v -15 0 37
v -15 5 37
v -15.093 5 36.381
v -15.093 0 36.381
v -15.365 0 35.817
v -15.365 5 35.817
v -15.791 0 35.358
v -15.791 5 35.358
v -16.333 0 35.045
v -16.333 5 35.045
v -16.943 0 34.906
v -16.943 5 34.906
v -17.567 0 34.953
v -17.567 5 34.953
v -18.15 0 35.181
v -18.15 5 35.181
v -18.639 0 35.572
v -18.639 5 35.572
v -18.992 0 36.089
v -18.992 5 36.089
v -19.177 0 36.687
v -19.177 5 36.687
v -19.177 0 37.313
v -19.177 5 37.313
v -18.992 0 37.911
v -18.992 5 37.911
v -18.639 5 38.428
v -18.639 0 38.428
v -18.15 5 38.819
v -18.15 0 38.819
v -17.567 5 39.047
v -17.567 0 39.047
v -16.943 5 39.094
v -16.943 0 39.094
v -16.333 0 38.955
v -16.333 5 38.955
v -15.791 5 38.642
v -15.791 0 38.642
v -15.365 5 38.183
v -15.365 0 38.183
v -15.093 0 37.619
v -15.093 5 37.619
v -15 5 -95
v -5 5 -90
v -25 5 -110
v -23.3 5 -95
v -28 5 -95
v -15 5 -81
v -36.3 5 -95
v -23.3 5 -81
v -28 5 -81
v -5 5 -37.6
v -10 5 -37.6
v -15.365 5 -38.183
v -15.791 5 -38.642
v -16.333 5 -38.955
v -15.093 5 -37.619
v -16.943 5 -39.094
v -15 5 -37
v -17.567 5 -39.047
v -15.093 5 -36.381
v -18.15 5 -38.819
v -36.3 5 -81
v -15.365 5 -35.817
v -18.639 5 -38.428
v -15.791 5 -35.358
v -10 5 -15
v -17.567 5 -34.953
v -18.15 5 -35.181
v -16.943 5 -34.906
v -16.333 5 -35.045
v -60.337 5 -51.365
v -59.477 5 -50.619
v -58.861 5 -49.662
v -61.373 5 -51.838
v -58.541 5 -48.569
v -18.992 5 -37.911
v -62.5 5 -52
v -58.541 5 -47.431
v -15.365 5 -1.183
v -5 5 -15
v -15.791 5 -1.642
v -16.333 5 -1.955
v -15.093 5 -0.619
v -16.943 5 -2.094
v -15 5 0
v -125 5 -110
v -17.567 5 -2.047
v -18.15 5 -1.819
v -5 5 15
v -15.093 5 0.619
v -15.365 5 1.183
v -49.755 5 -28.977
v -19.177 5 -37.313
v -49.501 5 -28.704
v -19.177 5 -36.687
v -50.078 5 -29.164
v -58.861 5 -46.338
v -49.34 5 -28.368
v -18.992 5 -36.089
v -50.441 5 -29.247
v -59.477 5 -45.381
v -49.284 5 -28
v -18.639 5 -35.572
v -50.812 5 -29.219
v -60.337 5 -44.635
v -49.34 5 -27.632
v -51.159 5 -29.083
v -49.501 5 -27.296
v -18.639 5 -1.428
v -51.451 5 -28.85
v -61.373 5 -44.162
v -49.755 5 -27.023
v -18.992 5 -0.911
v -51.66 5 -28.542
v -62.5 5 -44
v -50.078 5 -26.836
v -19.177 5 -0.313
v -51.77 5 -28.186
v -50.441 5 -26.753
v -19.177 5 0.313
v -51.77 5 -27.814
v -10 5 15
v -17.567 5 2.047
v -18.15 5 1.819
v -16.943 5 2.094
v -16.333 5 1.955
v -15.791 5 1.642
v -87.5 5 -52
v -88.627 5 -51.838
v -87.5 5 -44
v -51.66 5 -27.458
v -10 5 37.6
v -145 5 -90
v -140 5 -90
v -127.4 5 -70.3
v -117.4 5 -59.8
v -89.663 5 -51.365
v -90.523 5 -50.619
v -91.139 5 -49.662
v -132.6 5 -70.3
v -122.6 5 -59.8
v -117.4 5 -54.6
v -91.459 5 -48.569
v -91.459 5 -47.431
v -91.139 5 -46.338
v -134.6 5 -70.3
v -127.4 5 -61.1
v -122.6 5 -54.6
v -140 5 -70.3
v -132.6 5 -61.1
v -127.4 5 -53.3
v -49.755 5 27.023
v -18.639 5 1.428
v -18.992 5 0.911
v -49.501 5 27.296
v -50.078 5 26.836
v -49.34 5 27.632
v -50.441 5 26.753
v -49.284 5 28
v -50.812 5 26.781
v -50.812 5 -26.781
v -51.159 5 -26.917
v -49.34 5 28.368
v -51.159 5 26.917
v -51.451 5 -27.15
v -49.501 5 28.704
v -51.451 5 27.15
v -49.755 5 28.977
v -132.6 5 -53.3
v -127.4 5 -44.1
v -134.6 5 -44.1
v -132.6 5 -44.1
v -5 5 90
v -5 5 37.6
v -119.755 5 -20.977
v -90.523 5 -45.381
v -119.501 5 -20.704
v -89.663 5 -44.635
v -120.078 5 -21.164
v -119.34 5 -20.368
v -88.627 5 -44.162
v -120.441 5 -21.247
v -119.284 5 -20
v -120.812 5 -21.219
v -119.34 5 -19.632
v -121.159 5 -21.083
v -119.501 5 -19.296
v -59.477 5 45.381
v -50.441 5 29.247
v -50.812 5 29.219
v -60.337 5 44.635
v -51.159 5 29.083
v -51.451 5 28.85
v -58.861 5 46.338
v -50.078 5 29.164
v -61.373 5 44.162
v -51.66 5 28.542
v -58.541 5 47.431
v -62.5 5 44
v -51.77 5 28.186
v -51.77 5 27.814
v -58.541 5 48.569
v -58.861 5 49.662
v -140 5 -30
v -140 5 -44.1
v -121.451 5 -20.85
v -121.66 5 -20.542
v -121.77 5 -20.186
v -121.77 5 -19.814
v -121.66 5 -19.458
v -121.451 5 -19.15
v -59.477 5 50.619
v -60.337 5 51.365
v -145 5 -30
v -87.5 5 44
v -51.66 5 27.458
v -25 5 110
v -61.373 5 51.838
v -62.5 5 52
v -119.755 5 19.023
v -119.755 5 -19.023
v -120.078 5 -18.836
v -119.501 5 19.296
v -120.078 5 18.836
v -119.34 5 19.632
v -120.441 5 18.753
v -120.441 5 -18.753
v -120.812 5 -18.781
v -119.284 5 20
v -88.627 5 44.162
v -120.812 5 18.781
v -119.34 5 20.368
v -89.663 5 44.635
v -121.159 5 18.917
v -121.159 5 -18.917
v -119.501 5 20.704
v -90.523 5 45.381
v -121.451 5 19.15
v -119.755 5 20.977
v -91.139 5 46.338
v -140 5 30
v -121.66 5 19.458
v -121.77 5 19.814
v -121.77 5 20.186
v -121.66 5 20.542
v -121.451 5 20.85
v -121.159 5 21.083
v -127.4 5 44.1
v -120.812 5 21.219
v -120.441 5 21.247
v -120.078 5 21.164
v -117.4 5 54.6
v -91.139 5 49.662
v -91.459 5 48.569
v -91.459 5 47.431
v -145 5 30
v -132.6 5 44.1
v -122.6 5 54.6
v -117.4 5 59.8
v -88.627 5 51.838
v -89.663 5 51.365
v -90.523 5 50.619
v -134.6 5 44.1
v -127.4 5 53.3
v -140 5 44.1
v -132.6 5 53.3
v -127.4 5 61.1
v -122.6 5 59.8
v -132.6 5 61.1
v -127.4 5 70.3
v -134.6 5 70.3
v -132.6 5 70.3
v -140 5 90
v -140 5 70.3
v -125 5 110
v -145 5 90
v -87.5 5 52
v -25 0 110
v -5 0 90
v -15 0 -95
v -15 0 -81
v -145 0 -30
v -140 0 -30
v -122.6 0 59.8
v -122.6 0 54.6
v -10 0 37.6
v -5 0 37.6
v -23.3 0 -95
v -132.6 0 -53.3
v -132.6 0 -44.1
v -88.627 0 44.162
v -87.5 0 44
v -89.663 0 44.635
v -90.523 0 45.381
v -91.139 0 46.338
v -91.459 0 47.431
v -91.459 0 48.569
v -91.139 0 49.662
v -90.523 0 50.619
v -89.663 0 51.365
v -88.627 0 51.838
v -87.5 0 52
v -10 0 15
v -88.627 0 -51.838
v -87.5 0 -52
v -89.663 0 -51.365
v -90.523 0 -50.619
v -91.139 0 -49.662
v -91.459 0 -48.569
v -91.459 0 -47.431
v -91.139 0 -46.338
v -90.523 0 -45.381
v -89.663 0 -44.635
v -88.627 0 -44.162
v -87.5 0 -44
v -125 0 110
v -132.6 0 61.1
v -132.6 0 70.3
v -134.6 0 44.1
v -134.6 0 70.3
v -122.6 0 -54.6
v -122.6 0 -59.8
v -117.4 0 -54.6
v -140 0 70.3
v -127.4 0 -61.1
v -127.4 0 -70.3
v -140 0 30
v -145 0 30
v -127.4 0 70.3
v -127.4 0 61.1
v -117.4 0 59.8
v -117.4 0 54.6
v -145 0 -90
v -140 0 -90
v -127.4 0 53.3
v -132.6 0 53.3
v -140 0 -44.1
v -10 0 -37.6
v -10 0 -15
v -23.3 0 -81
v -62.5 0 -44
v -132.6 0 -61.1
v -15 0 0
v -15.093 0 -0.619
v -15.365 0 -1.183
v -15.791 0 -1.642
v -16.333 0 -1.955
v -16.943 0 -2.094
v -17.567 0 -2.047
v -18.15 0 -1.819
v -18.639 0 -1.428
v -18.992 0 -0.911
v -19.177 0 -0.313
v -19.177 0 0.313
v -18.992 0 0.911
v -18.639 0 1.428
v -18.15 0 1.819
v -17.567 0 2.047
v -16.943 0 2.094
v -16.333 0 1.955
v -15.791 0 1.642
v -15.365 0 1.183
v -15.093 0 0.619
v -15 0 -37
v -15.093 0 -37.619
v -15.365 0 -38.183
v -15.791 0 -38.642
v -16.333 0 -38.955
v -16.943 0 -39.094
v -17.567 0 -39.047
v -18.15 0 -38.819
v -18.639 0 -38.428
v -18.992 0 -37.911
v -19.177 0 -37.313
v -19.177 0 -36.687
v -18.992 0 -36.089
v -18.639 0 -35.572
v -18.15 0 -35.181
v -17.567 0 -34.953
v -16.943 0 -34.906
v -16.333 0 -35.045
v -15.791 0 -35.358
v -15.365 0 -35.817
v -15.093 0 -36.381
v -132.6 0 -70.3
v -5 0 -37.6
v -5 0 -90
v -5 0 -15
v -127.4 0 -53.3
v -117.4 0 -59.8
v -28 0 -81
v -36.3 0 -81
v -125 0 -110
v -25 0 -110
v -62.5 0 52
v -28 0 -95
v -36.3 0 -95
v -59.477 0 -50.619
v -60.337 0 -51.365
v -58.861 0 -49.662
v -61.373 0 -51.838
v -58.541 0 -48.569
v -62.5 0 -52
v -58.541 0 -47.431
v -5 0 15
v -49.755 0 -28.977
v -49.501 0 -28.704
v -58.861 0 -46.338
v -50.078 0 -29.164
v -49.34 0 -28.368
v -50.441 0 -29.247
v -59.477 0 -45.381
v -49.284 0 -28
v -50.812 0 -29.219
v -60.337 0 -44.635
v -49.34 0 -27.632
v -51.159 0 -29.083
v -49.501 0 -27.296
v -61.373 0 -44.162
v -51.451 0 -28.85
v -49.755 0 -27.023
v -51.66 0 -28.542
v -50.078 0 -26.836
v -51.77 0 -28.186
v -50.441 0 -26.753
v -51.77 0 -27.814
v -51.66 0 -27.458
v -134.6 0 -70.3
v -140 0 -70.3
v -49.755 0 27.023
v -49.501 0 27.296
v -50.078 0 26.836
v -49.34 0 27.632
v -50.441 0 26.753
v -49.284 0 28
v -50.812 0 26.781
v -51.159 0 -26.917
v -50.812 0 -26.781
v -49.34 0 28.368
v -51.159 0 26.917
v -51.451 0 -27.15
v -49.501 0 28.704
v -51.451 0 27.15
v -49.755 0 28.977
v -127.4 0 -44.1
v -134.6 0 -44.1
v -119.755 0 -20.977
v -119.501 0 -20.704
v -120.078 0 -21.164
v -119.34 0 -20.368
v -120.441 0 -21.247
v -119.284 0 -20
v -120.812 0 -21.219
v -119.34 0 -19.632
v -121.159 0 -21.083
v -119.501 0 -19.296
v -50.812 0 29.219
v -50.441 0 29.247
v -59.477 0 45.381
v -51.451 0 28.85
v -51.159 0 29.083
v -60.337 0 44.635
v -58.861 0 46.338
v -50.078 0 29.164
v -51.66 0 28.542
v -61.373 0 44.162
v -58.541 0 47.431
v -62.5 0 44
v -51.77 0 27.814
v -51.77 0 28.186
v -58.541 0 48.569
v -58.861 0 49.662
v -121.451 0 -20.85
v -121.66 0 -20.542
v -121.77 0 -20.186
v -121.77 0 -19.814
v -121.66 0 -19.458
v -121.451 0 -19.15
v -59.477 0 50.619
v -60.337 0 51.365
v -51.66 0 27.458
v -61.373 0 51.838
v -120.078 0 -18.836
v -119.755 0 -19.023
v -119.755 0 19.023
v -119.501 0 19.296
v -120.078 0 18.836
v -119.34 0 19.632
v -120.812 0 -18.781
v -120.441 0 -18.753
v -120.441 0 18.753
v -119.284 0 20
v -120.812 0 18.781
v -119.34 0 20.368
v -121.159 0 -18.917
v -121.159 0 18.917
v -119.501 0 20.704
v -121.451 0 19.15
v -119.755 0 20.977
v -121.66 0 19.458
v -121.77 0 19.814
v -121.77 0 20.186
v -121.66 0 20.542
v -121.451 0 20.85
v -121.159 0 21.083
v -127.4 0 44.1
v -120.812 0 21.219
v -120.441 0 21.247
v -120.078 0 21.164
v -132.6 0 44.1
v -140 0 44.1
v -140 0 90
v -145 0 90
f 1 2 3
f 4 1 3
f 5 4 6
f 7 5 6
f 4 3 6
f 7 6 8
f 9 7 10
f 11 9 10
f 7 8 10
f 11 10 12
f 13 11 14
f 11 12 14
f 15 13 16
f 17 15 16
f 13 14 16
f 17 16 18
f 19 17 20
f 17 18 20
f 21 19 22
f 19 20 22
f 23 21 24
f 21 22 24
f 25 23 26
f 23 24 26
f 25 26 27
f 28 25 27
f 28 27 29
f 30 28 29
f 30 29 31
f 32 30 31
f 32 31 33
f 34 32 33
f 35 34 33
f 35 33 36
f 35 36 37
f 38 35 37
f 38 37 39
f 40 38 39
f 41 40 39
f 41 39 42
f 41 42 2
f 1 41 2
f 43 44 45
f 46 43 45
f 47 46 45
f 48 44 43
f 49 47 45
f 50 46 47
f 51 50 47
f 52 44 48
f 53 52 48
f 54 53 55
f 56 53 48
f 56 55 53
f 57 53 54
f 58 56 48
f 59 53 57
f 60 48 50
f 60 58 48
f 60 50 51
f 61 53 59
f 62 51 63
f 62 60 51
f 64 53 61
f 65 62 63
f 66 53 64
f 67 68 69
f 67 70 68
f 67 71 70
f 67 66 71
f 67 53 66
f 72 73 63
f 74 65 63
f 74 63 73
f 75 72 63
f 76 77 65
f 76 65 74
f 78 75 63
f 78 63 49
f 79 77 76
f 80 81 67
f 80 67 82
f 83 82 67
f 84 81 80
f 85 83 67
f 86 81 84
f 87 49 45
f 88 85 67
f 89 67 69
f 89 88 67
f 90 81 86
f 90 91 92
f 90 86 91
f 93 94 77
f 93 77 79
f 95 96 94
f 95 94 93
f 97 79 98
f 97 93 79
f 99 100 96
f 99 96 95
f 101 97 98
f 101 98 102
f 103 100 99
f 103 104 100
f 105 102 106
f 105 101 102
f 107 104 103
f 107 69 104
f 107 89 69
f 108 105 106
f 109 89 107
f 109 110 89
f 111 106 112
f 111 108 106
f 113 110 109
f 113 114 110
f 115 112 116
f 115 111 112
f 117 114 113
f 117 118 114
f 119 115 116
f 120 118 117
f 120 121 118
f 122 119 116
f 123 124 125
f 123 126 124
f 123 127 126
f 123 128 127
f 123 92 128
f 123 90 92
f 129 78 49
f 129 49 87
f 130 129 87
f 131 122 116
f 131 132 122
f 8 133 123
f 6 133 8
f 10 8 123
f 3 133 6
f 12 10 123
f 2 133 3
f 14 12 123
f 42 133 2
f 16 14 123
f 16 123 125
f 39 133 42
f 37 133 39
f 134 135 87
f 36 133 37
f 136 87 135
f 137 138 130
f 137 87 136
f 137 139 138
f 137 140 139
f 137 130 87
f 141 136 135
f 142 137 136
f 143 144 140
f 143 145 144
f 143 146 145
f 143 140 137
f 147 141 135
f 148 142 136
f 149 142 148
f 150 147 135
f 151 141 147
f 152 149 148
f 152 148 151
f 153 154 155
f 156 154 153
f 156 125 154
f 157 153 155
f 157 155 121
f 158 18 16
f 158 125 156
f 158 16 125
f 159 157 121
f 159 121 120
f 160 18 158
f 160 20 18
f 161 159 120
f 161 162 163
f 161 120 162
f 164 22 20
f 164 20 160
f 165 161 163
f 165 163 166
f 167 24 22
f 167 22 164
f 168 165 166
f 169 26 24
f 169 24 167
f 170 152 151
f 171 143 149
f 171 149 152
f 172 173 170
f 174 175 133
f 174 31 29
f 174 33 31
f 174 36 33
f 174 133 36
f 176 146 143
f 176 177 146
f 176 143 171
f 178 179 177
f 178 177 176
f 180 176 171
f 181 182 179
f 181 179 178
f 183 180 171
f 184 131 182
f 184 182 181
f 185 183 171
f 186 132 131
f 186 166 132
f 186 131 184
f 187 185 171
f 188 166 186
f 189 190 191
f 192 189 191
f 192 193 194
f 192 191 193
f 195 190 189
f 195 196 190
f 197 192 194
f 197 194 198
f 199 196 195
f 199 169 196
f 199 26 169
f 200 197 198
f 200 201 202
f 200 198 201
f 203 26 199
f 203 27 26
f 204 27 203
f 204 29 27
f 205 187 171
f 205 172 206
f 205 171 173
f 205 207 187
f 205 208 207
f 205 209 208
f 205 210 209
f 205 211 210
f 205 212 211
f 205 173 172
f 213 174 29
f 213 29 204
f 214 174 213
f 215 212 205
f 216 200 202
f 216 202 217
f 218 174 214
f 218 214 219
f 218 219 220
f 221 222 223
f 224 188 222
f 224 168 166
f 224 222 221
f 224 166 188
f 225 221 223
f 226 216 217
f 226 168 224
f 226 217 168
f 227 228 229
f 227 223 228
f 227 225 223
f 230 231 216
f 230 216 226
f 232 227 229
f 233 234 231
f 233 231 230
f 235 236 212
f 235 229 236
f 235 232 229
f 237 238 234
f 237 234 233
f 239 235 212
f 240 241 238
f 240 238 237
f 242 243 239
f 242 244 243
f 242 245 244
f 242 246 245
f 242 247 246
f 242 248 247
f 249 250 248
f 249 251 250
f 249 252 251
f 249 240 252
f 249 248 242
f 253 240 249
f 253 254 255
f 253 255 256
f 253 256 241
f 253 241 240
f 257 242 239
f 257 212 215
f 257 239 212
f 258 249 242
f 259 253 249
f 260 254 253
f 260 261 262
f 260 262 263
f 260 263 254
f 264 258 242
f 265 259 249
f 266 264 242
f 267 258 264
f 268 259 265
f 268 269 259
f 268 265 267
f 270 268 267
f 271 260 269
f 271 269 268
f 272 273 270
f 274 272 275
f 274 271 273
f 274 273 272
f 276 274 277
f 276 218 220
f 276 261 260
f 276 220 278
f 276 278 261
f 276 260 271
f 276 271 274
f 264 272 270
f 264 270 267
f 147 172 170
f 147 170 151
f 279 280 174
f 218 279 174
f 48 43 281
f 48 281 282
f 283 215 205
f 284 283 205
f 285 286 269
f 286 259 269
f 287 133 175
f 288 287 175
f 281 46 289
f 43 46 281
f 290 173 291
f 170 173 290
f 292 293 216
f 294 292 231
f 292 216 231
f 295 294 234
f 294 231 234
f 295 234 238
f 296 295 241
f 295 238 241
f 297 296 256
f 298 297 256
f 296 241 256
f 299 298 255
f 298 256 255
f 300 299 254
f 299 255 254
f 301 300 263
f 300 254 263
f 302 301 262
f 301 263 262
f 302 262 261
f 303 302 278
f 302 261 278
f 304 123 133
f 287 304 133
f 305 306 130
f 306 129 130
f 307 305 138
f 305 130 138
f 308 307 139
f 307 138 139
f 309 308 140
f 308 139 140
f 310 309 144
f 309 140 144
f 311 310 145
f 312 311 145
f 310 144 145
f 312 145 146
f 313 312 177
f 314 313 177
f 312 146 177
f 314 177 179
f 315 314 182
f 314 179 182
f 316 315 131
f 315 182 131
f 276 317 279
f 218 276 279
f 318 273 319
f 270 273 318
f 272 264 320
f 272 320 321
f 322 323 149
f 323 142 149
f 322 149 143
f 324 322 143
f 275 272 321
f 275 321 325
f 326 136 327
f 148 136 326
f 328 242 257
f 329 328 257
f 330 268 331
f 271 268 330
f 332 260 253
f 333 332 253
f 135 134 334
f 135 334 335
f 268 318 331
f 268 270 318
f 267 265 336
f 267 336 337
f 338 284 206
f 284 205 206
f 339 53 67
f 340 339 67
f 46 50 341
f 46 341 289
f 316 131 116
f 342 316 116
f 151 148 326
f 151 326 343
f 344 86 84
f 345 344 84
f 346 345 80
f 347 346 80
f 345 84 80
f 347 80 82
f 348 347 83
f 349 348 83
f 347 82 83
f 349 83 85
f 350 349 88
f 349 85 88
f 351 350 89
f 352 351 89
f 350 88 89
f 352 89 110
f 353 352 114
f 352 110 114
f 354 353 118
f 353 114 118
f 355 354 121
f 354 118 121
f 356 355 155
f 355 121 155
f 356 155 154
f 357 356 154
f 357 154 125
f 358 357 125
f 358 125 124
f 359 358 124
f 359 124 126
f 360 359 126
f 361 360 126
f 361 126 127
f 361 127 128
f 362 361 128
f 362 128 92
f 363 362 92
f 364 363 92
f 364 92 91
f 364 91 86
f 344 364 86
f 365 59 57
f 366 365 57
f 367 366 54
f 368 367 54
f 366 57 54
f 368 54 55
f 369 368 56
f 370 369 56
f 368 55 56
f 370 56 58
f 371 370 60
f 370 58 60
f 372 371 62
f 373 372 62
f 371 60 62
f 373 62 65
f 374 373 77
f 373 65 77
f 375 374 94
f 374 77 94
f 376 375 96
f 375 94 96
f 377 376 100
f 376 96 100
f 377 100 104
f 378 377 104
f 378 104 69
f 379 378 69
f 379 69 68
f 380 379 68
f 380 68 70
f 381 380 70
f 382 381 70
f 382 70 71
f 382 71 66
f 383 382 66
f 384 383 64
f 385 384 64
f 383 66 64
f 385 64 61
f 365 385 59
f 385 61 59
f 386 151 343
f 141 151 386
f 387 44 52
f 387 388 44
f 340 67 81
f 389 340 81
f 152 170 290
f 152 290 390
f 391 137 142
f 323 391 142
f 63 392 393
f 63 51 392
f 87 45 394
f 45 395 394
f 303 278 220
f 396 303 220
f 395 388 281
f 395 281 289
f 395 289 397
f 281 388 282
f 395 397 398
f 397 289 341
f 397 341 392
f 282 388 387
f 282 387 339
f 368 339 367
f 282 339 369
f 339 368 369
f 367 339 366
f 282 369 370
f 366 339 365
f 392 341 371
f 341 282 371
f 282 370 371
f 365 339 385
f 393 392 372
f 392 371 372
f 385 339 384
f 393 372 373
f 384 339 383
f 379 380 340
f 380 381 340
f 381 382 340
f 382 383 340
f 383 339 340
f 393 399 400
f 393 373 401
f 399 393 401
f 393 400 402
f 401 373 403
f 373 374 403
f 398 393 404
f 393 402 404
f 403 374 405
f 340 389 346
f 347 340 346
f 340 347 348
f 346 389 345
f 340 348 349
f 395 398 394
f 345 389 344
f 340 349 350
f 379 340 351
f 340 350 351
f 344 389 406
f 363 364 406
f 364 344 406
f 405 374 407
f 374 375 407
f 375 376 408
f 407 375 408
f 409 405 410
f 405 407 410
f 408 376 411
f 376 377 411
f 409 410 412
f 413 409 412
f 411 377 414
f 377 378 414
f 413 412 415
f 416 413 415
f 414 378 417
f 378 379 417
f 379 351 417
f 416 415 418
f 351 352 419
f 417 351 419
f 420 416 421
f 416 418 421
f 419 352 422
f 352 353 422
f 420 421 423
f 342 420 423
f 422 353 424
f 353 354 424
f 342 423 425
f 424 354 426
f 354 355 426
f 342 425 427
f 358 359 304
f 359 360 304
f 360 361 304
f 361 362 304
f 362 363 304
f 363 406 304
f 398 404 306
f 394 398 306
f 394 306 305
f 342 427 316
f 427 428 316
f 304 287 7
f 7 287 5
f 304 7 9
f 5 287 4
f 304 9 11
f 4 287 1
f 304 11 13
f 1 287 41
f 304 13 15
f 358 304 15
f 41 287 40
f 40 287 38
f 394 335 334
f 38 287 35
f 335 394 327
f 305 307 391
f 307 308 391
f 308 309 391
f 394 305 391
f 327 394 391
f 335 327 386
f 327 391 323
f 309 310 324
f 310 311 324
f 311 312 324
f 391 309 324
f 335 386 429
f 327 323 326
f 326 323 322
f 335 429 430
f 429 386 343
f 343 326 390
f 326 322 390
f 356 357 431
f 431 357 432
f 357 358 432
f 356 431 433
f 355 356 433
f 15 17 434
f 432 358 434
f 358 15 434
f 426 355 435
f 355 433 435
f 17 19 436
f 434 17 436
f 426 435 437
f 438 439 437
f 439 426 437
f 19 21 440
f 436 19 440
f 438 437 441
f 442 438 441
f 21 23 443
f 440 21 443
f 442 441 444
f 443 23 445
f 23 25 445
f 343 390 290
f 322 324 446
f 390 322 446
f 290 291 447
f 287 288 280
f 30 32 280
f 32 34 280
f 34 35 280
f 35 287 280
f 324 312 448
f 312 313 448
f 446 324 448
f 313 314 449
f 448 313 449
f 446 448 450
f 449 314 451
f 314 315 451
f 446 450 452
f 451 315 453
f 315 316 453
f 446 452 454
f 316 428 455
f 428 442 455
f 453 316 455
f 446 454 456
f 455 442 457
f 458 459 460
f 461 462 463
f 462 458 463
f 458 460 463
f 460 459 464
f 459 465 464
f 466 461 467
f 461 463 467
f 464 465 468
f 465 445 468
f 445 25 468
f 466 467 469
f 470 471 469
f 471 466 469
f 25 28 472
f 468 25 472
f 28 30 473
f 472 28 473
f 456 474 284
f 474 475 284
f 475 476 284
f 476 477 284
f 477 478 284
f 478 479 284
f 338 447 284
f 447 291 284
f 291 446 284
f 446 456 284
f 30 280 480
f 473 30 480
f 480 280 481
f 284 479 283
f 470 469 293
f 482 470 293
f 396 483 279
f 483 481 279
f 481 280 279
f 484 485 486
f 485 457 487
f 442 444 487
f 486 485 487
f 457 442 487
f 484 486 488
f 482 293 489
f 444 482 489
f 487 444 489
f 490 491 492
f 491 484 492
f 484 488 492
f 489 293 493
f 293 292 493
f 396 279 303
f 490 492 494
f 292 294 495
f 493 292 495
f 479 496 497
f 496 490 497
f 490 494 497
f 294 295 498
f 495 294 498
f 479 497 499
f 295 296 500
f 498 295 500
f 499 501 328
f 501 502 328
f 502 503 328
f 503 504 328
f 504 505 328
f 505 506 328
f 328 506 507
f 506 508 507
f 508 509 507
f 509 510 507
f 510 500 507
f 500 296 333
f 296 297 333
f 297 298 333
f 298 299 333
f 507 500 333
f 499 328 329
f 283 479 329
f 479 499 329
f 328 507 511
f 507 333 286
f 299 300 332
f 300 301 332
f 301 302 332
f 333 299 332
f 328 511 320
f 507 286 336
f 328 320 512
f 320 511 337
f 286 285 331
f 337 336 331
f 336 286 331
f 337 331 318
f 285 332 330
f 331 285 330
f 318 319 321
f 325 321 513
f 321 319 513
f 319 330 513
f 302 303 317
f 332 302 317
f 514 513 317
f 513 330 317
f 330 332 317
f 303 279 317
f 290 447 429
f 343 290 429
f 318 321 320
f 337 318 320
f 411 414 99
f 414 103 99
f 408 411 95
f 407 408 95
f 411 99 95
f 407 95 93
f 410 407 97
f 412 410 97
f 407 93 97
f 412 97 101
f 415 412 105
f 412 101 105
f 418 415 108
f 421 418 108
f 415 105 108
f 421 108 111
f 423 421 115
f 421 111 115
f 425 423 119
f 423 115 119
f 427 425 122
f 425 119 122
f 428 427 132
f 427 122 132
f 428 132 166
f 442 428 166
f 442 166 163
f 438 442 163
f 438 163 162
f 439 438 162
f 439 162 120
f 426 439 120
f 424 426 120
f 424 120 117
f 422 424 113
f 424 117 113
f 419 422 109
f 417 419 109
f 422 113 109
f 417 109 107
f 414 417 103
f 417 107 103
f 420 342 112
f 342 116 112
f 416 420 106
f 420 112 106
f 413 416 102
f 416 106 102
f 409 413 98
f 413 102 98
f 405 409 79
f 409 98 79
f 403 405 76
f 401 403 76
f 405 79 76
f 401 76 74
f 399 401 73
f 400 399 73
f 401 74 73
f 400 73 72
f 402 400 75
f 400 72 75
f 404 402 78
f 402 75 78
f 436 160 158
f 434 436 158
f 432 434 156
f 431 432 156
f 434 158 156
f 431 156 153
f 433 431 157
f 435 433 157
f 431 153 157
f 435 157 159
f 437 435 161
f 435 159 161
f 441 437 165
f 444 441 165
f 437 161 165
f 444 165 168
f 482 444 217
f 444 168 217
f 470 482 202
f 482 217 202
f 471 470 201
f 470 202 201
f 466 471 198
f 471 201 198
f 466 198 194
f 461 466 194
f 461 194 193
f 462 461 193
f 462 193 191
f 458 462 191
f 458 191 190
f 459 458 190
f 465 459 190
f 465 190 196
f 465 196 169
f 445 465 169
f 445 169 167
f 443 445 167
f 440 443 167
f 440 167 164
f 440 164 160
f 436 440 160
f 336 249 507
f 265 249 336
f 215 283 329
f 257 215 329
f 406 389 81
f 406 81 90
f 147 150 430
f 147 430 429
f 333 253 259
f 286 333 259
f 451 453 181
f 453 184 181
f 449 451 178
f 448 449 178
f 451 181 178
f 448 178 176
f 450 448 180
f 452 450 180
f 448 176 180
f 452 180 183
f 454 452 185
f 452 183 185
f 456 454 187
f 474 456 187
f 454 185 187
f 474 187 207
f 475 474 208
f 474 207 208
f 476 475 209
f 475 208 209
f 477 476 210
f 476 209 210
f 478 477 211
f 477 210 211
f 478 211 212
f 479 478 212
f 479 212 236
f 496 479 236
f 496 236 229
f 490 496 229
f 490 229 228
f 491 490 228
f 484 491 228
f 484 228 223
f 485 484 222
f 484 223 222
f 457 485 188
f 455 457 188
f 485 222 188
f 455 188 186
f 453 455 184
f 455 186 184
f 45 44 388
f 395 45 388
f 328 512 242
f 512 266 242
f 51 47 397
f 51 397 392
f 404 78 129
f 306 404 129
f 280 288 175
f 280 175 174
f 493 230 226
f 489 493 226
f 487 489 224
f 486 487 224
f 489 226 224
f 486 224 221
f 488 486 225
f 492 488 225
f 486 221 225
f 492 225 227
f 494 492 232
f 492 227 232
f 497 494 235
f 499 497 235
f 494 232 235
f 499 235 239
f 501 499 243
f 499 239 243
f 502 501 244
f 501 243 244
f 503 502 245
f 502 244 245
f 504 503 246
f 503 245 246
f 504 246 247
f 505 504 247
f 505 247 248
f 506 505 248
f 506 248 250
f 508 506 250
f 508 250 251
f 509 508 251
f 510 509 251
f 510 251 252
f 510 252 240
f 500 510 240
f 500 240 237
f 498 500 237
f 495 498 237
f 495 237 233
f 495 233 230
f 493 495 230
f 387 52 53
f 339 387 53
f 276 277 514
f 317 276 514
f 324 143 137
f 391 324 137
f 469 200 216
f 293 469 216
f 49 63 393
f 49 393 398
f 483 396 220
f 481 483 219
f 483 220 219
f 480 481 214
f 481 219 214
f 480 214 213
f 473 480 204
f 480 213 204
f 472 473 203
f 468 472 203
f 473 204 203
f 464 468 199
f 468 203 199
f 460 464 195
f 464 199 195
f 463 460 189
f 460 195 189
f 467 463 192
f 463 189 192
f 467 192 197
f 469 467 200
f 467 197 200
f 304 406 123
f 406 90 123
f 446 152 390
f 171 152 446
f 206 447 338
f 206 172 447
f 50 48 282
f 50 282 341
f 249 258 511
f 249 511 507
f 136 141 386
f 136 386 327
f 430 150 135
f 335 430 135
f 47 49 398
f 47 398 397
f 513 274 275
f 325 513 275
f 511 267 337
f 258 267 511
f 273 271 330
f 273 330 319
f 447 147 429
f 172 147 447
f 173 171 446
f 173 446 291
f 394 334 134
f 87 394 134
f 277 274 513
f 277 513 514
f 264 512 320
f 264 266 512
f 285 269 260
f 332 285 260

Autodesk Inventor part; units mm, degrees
ref_plane "YZ Plane" through (0, 0, 0) normal (1, 0, 0) x (0, 1, 0)
ref_plane "XZ Plane" through (0, 0, 0) normal (0, 1, 0) x (-1, 0, 0)
ref_plane "XY Plane" through (0, 0, 0) normal (0, 0, 1) x (1, 0, 0)
sketch "Sketch1" plane through (0, 0, 0) normal (0, 1, 0) x (-1, 0, 0)
  line L0 (145, 110) -> (-145, 110)
  line L1 (-145, 110) -> (-145, -110)
  line L2 (-145, -110) -> (145, -110)
  line L3 (145, -110) -> (145, 110)
  line L4 (145, 110) -> (-145, -110) construction
  line L5 (-145, 110) -> (145, -110) construction
  line L6 (105, -80.8333) -> (35, -80.8333)
  line L7 (35, -80.8333) -> (35, -115.8333)
  line L8 (35, -115.8333) -> (105, -115.8333)
  line L9 (105, -115.8333) -> (105, -80.8333)
  line L10 (105, -80.8333) -> (35, -115.8333) construction
  line L11 (35, -80.8333) -> (105, -115.8333) construction
  line L12 (-35, -115.8333) -> (-105, -115.8333)
  line L13 (-105, -115.8333) -> (-105, -80.8333)
  line L14 (-105, -80.8333) -> (-35, -80.8333)
  line L15 (-35, -80.8333) -> (-35, -115.8333)
  line L16 (-35, -115.8333) -> (-105, -80.8333) construction
  line L17 (-105, -115.8333) -> (-35, -80.8333) construction
  line L18 (0, 110) -> (0, -110) construction
  line L19 (5, -110) -> (5, 110)
  point P0 (0, 0)
  point P1 (70, -98.3333)
  point P2 (-70, -98.3333)
  point P3 (0, 0)
  point P4 (-105, -110)
  point P5 (-35, -110)
  point P6 (-15, -80.8333)
  point P7 (-55, -80.8333)
  point P8 (105, -110)
  point P9 (35, -110)
  dimension "d1" = 70
  dimension "d2" = 70
  dimension "d3" = 35
  dimension "d4" = 35
  dimension "d5" = 140
  dimension "d6" = 11.6667
  dimension "d7" = 220
  dimension "d8" = 290
  dimension "d34" = 140
extrude "Extrusion1" add sketch "Sketch1" along normal blind 5 contours L3 L2 L9 L6 L7 L19 L0 | L2 L7 L6 L9
sketch "Sketch5" plane through (0, 5, 0) normal (0, 1, 0) x (1, 0, 0)
  line L0 (-145, -110) -> (-5, -110) construction
  line L1 (-5, -110) -> (-5, 110) construction
  line L2 (-5, 110) -> (-145, 110) construction
  line L3 (-145, 110) -> (-145, -110) construction
  circle A0 centre (-120.5342, 20) radius 1.25
  circle A1 centre (-120.5342, -20) radius 1.25
  circle A2 centre (-50.5342, 28) radius 1.25
  circle A3 centre (-50.5342, -28) radius 1.25
  line L4 (-145, 0) -> (-5, 0) construction
  point P0 (0, 0)
  dimension "d35" = 56
  dimension "d36" = 40
  dimension "d37" = 70
  dimension "d38" = 2.5
  dimension "d39" = 2.5
extrude "Extrusion6" cut sketch "Sketch5" against normal through all
chamfer "Chamfer1" distance 20 angle 45 4 edges at (-145, 2.5, 110) (-145, 2.5, -110) (-5, 2.5, 110) (-5, 2.5, -110)
sketch "Sketch6" plane through (0, 5, 0) normal (0, 1, 0) x (1, 0, 0)
  circle A0 centre (-50.5342, -28) radius 1.25 projected
  circle A1 centre (-50.5342, 28) radius 1.25 projected
  circle A2 centre (-120.5342, -20) radius 1.25 projected
  circle A3 centre (-120.5342, 20) radius 1.25 projected
  line L0 (-25, 110) -> (-5, 90) projected
  line L1 (-25, 110) -> (-125, 110) projected
  line L2 (-145, 90) -> (-125, 110) projected
  line L3 (-145, 90) -> (-145, -90) projected
  line L4 (-125, -110) -> (-145, -90) projected
  line L5 (-125, -110) -> (-25, -110) projected
  line L6 (-5, -90) -> (-25, -110) projected
  line L7 (-5, -90) -> (-5, 90) projected
  line L8 (-145, 90) -> (-145, -90) projected
  line L9 (-5, 37.6) -> (-10, 37.6)
  line L10 (-10, 37.6) -> (-10, 15)
  line L11 (-10, 15) -> (-5, 15)
  line L12 (-5, 15) -> (-5, 37.6)
  line L13 (-5, 37.6) -> (-10, 15) construction
  line L14 (-10, 37.6) -> (-5, 15) construction
  line L15 (-5, -90) -> (-5, 90) projected
  line L16 (-87.5, 48) -> (-62.5, 48) construction
  line L17 (-87.5, 44) -> (-62.5, 44)
  line L18 (-62.5, 52) -> (-87.5, 52)
  arc A4 (-87.5, 52) -> (-87.5, 44) centre (-87.5, 48) ccw
  arc A5 (-62.5, 44) -> (-62.5, 52) centre (-62.5, 48) ccw
  line L19 (-145, 30) -> (-140, 30)
  line L20 (-140, 30) -> (-140, -30) construction
  line L21 (-140, -30) -> (-145, -30)
  line L22 (-145, -30) -> (-145, 30)
  line L23 (-145, 30) -> (-140, -30) construction
  line L24 (-140, 30) -> (-145, -30) construction
  line L25 (-140, 30) -> (-140, 95)
  line L26 (-140, -30) -> (-140, -95)
  line L27 (-145, 90) -> (-140, 90)
  point P0 (0, 0)
  point P1 (-7.5, 26.3)
  point P2 (-5, 15)
  point P3 (-5, 37.6)
  point P4 (-75, 48)
  point P5 (-75, 110)
  point P6 (-142.5, 0)
  point P7 (-145, 0)
  point P8 (-145, 0)
  dimension "d57" = 5
  dimension "d58" = 22.6
  dimension "d59" = 15
  dimension "d60" = 8
  dimension "d61" = 25
  dimension "d86" = 5
  dimension "d87" = 60
  dimension "d88" = 48
extrude "Extrusion7" cut sketch "Sketch6" against normal through all contours L7 L11 L10 L9 | L27 L25 L19 L3 | A4 L18 A5 L17
mirror "Mirror6" about plane through (0, 0, 0) normal (0, 0, 1) of "Extrusion7"
sketch "Sketch8" plane through (0, 5, 0) normal (0, 1, 0) x (1, 0, 0)
  circle A0 centre (-120.5342, 20) radius 1.25 construction
  circle A1 centre (-120.5342, -20) radius 1.25 construction
  circle A2 centre (-50.5342, 28) radius 1.25 construction
  circle A3 centre (-50.5342, -28) radius 1.25 construction
  line L0 (-87.5, 52) -> (-62.5, 52) construction
  arc A4 (-62.5, 44) -> (-62.5, 52) centre (-62.5, 48) ccw construction
  line L1 (-62.5, 44) -> (-87.5, 44) construction
  arc A5 (-87.5, 52) -> (-87.5, 44) centre (-87.5, 48) ccw construction
  line L2 (-87.5, -44) -> (-62.5, -44) construction
  arc A6 (-62.5, -52) -> (-62.5, -44) centre (-62.5, -48) ccw construction
  line L3 (-62.5, -52) -> (-87.5, -52) construction
  arc A7 (-87.5, -44) -> (-87.5, -52) centre (-87.5, -48) ccw construction
  line L4 (-125, -110) -> (-145, -90) construction
  line L5 (-125, -110) -> (-25, -110) construction
  line L6 (-5, -90) -> (-25, -110) construction
  line L7 (-5, -90) -> (-5, -37.6) construction
  line L8 (-5, -37.6) -> (-10, -37.6) construction
  line L9 (-10, -37.6) -> (-10, -15) construction
  line L10 (-10, -15) -> (-5, -15) construction
  line L11 (-5, -15) -> (-5, 15) construction
  line L12 (-5, 15) -> (-10, 15) construction
  line L13 (-10, 15) -> (-10, 37.6) construction
  line L14 (-10, 37.6) -> (-5, 37.6) construction
  line L15 (-5, 37.6) -> (-5, 90) construction
  line L16 (-25, 110) -> (-5, 90) construction
  line L17 (-25, 110) -> (-125, 110) construction
  line L18 (-145, 90) -> (-125, 110) construction
  line L19 (-145, 30) -> (-145, -30) construction
  line L20 (-23.3, 95) -> (-15, 95)
  line L21 (-15, 95) -> (-15, 81)
  line L22 (-15, 81) -> (-23.3, 81)
  line L23 (-23.3, 81) -> (-23.3, 95)
  line L24 (-23.3, 95) -> (-15, 81) construction
  line L25 (-15, 95) -> (-23.3, 81) construction
  line L26 (-36.3, 95) -> (-28, 95)
  line L27 (-28, 95) -> (-28, 81)
  line L28 (-28, 81) -> (-36.3, 81)
  line L29 (-36.3, 81) -> (-36.3, 95)
  line L30 (-36.3, 95) -> (-28, 81) construction
  line L31 (-28, 95) -> (-36.3, 81) construction
  line L32 (-132.6, -44.1) -> (-127.4, -44.1)
  line L33 (-127.4, -44.1) -> (-127.4, -53.3)
  line L34 (-127.4, -53.3) -> (-132.6, -53.3)
  line L35 (-132.6, -53.3) -> (-132.6, -44.1)
  line L36 (-132.6, -44.1) -> (-127.4, -53.3) construction
  line L37 (-127.4, -44.1) -> (-132.6, -53.3) construction
  line L38 (-132.6, -61.1) -> (-127.4, -61.1)
  line L39 (-127.4, -61.1) -> (-127.4, -70.3)
  line L40 (-127.4, -70.3) -> (-132.6, -70.3)
  line L41 (-132.6, -70.3) -> (-132.6, -61.1)
  line L42 (-132.6, -61.1) -> (-127.4, -70.3) construction
  line L43 (-127.4, -61.1) -> (-132.6, -70.3) construction
  line L44 (-117.4, -54.6) -> (-122.6, -54.6)
  line L45 (-122.6, -54.6) -> (-122.6, -59.8)
  line L46 (-122.6, -59.8) -> (-117.4, -59.8)
  line L47 (-117.4, -59.8) -> (-117.4, -54.6)
  line L48 (-117.4, -54.6) -> (-122.6, -59.8) construction
  line L49 (-122.6, -54.6) -> (-117.4, -59.8) construction
  line L50 (-130, -48.7) -> (-130, -65.7) construction
  line L51 (-140, -44.1) -> (-134.6, -44.1)
  line L52 (-134.6, -44.1) -> (-134.6, -70.3)
  line L53 (-134.6, -70.3) -> (-140, -70.3)
  line L54 (-140, -70.3) -> (-140, -44.1)
  line L55 (-140, -44.1) -> (-134.6, -70.3) construction
  line L56 (-134.6, -44.1) -> (-140, -70.3) construction
  line L57 (-140, 90) -> (-140, 30) projected
  line L58 (-140, 30) -> (-145, 30) projected
  line L59 (-145, -30) -> (-140, -30) projected
  line L60 (-140, -30) -> (-140, -90) projected
  circle A8 centre (-17.1, 0) radius 2.1
  circle A9 centre (-17.1, 37) radius 2.1
  circle A10 centre (-17.1, -37) radius 2.1
  point P0 (0, 0)
  point P1 (-19.15, 88)
  point P2 (-32.15, 88)
  point P3 (-120, -57.2)
  point P4 (-130, -57.2)
  point P5 (-137.3, -57.2)
  point P6 (-140, 95)
  point P7 (-140, -95)
  dimension "d63" = 14
  dimension "d64" = 8.3
  dimension "d65" = 14
  dimension "d66" = 8.3
  dimension "d67" = 13
  dimension "d68" = 15
  dimension "d69" = 10
  dimension "d72" = 52.8
  dimension "d73" = 10
  dimension "d74" = 9.2
  dimension "d75" = 9.2
  dimension "d76" = 5.2
  dimension "d77" = 5.2
  dimension "d78" = 5.2
  dimension "d79" = 5.2
  dimension "d80" = 15
  dimension "d81" = 17
  dimension "d83" = 2
  dimension "d89" = 4.2
  dimension "d90" = 4.2
  dimension "d91" = 4.2
  dimension "d92" = 17.1
  dimension "d93" = 37
  dimension "d94" = 37
extrude "Extrusion8" cut sketch "Sketch8" against normal through all contours L20 L21 L22 L23 | L26 L27 L28 L29 | A8 | A9 | A10
extrude "Extrusion9" cut sketch "Sketch8" against normal through all contours L32 L33 L34 L35 | L38 L39 L40 L41 | L47 L46 L45 L44 | L51 L52 L53 L54
mirror "Mirror7" about plane through (0, 0, 0) normal (0, 0, 1) of "Extrusion9"
equation "\"d2\" = d1"
equation "\"d4\" = d3"
equation "\"d6\" = 0.333333 * d3"
equation "\"d39\" = d38"
equation "\"d65\" = d63"
equation "\"d66\" = d64"
equation "\"d75\" = d74"
equation "\"d77\" = d76"
equation "\"d90\" = d89"
equation "\"d91\" = d89"
equation "\"d94\" = d93"
properties part number "top-plate"
